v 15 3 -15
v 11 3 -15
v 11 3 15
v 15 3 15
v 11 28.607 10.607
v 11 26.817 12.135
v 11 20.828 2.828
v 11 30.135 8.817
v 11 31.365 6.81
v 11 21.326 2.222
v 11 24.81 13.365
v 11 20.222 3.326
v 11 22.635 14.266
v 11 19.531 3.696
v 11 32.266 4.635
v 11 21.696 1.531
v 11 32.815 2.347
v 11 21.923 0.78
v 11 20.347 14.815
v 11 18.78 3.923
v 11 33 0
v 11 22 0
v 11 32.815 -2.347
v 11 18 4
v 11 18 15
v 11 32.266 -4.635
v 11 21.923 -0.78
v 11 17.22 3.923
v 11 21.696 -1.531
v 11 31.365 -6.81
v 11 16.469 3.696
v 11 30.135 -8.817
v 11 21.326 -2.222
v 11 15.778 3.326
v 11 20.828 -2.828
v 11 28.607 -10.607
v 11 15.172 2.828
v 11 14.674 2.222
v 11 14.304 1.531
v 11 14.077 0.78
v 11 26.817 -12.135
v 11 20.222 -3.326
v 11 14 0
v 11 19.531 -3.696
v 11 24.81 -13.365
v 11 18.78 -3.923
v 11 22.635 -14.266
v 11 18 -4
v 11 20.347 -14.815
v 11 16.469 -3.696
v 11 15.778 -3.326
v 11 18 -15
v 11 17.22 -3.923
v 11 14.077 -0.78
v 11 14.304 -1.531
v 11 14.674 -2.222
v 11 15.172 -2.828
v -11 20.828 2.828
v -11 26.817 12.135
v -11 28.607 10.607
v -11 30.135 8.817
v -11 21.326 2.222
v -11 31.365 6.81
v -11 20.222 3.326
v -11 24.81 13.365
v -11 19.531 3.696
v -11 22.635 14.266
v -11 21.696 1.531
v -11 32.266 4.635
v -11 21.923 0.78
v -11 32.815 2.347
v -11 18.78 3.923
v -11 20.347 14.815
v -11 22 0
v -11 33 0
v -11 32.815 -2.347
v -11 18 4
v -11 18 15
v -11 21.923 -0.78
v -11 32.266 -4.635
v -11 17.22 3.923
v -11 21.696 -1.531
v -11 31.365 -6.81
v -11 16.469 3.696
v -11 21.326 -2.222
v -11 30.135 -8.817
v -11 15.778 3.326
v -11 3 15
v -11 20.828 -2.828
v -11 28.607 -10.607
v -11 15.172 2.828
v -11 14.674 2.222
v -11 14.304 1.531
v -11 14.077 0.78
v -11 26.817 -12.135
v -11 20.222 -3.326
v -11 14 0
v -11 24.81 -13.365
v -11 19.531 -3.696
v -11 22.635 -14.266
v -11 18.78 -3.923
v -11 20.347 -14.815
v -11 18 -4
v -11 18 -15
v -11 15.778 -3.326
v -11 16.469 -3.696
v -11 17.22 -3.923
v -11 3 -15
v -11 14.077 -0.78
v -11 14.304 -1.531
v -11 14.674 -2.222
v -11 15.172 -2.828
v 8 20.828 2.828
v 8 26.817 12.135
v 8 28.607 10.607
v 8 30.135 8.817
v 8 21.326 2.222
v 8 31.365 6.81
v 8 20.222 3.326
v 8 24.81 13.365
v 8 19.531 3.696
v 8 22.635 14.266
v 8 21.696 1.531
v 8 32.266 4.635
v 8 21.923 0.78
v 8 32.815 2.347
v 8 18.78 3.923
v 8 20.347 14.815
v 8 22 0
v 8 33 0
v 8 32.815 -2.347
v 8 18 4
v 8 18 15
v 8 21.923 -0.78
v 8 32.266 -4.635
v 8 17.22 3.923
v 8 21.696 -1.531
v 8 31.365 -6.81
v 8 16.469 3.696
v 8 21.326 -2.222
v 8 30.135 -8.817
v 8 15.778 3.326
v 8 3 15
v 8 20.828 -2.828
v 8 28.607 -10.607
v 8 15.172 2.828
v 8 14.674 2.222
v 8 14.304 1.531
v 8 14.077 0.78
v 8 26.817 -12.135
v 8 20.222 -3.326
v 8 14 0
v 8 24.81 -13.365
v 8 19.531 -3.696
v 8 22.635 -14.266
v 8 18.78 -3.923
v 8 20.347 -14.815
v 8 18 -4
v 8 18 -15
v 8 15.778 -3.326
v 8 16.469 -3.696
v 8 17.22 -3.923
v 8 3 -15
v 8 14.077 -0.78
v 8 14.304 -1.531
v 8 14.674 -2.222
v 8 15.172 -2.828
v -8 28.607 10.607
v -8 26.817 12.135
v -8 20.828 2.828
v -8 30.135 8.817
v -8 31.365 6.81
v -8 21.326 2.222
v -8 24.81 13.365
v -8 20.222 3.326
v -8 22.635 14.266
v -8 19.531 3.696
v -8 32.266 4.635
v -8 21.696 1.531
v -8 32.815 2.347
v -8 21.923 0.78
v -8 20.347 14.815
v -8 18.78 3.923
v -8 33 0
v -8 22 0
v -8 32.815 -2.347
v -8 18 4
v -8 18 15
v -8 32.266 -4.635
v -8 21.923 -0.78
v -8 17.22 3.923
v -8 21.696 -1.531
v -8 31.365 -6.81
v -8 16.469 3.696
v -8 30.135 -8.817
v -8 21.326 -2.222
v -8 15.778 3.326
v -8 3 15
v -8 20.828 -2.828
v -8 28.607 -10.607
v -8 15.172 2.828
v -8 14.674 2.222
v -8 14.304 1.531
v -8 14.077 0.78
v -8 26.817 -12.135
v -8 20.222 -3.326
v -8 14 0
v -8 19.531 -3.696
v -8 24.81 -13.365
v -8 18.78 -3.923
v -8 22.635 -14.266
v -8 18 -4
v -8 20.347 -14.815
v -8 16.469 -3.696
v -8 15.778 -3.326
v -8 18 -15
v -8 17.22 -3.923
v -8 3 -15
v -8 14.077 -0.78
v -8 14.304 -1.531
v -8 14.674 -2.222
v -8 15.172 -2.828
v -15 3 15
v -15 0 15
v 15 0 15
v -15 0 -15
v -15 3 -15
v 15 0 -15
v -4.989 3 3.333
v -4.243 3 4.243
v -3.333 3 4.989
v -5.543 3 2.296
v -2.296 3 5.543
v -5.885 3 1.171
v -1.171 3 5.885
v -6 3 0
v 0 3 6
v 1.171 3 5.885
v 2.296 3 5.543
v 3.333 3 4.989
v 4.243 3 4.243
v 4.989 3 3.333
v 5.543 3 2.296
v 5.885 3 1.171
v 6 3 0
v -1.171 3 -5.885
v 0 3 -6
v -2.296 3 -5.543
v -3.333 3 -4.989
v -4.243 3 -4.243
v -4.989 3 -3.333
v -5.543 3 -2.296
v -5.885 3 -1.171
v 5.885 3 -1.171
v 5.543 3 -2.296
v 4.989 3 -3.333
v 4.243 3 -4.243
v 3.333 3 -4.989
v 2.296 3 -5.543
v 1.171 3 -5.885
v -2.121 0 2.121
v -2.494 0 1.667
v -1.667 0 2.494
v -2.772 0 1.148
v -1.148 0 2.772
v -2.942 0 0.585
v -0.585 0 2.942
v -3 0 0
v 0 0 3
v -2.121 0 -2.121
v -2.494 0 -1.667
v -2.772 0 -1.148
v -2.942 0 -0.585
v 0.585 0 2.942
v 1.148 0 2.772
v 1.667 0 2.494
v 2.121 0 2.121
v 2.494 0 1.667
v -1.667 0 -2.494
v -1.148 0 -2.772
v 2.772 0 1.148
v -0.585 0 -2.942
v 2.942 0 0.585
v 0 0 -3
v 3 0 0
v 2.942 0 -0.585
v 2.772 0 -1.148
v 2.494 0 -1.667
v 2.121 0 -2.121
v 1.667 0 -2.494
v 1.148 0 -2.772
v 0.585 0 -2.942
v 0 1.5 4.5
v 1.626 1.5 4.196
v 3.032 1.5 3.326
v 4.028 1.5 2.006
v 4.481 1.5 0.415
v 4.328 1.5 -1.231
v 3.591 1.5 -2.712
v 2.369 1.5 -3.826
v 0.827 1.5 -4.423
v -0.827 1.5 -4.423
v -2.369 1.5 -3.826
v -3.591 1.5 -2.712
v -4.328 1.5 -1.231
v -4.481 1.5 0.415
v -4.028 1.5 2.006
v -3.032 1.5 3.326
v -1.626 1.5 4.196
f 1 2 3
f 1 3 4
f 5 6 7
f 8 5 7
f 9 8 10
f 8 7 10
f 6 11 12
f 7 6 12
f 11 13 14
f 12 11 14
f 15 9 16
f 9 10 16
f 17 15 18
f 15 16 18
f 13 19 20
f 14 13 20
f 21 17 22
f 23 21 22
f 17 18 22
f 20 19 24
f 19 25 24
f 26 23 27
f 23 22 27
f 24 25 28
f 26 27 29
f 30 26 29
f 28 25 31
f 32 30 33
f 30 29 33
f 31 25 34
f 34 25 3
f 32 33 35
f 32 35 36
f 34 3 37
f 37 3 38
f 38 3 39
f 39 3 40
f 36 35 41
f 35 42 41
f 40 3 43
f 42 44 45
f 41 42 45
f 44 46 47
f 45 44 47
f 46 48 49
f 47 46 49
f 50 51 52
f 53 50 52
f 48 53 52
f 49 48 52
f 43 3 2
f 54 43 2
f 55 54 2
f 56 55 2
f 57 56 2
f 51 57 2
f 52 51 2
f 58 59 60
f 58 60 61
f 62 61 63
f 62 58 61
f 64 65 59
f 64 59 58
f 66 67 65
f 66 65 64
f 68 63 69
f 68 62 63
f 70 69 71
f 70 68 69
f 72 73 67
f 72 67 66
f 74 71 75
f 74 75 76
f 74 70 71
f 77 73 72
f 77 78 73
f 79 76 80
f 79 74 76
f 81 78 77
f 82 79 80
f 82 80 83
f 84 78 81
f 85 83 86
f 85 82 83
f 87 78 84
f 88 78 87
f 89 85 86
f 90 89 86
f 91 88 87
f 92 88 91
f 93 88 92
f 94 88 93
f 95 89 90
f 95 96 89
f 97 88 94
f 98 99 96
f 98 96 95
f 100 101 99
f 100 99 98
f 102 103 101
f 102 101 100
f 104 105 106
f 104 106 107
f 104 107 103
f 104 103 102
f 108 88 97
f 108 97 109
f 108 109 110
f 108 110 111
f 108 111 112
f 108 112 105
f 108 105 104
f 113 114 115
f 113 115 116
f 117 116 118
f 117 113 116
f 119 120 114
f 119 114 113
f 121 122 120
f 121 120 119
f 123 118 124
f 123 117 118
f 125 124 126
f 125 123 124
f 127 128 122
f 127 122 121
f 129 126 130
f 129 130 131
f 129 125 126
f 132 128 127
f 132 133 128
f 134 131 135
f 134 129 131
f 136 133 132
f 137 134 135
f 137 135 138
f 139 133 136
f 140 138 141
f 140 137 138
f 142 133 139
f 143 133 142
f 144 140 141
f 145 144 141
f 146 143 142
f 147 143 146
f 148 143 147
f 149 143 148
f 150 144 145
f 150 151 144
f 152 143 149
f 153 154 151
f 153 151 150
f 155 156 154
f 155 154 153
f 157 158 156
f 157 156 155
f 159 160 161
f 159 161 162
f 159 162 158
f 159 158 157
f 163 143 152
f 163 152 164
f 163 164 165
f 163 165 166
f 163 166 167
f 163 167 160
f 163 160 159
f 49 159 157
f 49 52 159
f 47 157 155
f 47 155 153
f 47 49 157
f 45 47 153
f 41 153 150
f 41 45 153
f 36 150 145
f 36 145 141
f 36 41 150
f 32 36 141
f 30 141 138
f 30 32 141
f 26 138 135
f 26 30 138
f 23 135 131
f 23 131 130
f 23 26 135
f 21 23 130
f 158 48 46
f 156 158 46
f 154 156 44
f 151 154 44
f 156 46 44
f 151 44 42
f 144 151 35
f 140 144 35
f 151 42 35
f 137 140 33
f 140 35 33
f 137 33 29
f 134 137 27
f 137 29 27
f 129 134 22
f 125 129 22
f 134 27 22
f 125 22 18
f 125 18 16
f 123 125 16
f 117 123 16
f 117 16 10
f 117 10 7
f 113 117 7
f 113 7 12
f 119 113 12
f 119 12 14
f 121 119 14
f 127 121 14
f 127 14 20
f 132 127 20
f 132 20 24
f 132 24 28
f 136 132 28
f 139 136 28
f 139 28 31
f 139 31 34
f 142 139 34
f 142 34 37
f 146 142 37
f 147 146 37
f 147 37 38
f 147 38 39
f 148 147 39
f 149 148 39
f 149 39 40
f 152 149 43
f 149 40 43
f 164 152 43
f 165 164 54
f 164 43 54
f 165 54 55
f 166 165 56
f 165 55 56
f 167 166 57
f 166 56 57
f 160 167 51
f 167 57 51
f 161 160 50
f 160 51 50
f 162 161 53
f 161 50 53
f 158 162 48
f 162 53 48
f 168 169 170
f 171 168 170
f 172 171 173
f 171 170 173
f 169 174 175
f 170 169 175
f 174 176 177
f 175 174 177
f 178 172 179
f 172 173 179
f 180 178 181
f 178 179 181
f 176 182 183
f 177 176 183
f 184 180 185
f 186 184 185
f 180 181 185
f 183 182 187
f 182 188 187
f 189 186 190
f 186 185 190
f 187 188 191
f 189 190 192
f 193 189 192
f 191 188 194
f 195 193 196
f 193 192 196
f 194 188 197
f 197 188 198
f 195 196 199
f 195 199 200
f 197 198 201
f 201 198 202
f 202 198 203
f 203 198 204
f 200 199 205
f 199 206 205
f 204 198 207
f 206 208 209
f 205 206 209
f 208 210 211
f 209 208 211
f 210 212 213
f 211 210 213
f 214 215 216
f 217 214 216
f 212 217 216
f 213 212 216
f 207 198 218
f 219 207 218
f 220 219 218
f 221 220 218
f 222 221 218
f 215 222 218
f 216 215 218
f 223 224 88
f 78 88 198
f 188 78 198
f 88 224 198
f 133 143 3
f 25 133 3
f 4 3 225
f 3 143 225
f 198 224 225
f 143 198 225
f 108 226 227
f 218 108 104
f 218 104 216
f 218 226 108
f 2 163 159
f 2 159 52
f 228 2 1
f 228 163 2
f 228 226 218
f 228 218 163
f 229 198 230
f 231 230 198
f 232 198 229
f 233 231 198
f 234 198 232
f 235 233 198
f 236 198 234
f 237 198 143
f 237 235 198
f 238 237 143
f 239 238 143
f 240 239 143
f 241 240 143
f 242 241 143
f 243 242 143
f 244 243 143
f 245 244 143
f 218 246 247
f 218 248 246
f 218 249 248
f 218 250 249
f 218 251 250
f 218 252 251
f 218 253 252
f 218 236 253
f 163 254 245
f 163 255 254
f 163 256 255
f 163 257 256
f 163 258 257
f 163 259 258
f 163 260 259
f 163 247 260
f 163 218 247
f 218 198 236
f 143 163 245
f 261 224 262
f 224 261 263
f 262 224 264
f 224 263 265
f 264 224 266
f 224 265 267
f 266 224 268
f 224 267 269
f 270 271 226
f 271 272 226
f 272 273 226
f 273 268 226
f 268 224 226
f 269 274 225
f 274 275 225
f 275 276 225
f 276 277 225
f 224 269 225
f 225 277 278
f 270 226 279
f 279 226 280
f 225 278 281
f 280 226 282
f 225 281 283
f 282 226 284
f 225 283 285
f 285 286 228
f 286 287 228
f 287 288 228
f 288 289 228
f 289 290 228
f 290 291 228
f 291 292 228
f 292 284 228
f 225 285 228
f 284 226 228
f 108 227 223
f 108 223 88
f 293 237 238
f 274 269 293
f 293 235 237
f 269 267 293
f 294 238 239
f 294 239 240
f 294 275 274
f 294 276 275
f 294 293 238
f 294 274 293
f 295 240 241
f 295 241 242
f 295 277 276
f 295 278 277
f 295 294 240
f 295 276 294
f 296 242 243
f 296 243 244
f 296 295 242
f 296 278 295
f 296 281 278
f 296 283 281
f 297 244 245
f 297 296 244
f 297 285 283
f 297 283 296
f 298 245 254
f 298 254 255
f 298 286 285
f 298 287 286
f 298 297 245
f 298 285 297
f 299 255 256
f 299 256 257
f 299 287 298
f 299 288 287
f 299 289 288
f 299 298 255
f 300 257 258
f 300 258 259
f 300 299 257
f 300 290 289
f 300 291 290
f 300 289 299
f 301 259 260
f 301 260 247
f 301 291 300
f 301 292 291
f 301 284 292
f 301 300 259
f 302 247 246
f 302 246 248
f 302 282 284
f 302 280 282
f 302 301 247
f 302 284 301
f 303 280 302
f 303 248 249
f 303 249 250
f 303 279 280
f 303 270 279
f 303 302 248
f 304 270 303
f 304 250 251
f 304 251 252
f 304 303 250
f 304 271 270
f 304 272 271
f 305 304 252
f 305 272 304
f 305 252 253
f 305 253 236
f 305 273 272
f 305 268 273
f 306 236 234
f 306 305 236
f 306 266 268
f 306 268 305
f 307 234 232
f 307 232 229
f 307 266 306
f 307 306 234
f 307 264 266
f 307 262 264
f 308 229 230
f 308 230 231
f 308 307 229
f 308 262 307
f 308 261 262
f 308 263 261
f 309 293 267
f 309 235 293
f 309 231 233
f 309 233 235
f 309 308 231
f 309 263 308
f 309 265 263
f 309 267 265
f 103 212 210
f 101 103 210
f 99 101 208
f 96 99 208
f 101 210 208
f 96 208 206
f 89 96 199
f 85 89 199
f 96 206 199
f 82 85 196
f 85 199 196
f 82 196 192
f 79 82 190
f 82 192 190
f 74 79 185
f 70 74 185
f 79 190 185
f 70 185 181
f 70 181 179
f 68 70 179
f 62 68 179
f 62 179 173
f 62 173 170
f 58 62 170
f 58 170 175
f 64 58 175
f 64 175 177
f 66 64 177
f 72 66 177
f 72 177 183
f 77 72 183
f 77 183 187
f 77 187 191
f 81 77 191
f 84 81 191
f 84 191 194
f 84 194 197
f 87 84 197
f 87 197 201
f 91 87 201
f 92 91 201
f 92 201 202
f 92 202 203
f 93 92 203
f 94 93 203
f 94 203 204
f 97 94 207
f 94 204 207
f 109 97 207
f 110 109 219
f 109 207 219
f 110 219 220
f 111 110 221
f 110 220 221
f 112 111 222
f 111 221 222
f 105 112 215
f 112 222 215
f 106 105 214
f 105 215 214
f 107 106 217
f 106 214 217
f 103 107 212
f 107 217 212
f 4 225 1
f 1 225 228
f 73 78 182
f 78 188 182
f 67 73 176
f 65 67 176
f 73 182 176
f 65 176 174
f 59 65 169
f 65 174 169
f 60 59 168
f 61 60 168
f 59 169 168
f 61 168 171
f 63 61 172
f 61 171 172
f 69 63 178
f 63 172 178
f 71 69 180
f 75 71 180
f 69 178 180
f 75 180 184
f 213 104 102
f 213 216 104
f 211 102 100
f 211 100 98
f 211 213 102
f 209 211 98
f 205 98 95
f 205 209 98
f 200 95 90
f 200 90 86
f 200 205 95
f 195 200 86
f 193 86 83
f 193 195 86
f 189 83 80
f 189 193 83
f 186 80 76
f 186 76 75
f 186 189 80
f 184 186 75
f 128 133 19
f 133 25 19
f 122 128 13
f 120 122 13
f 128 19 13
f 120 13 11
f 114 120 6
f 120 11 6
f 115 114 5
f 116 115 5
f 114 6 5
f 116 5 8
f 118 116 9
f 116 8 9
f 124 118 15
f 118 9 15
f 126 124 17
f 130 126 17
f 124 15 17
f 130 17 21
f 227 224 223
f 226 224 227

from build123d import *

# Parameters (mm, degrees)
CROQUIS1_W              = 30
CROQUIS1_H              = 30
SALIENTE_EXTRUIR1_DEPTH = 3
CROQUIS2_W              = 3
CROQUIS2_H              = 30
SALIENTE_EXTRUIR2_DEPTH = 30
REDONDEO1_R             = 15
CROQUIS3_R              = 4
CORTAR_EXTRUIR1_DEPTH   = 45.609416046
CROQUIS4_R              = 3
CORTAR_EXTRUIR2_DEPTH   = 37.742346142
CHAFL_N1_SIZE           = 3


with BuildPart() as part:
    # Croquis1 → Saliente-Extruir1 (new body)
    with BuildSketch(Plane(origin=(0, 0, 0), x_dir=(1, 0, 0), z_dir=(0, 1, 0))):
        Rectangle(CROQUIS1_W, CROQUIS1_H)
    extrude(amount=SALIENTE_EXTRUIR1_DEPTH)

    # Croquis2 → Saliente-Extruir2 (add)
    with BuildSketch(Plane(origin=(0, 3, 0), x_dir=(1, 0, 0), z_dir=(0, 1, 0))):
        with Locations((-9.5, 0)):
            Rectangle(CROQUIS2_W, CROQUIS2_H)
        with Locations((9.5, 0)):
            Rectangle(CROQUIS2_W, CROQUIS2_H)
    extrude(amount=SALIENTE_EXTRUIR2_DEPTH)

    # Redondeo1
    redondeo1_edges = [part.edges().sort_by_distance(p)[0] for p in [
        (-9.5, 33, -15),
        (9.5, 33, -15),
        (9.5, 33, 15),
        (-9.5, 33, 15),
    ]]
    fillet(redondeo1_edges, radius=REDONDEO1_R - 0.0001)  # a hair under: the kernel refuses the full size

    # Croquis3 → Cortar-Extruir1 (cut, through all)
    with BuildSketch(Plane(origin=(11, 0, 0), x_dir=(0, 0, -1), z_dir=(1, 0, 0))):
        with Locations((0, 18)):
            Circle(CROQUIS3_R)
    extrude(amount=-CORTAR_EXTRUIR1_DEPTH, mode=Mode.SUBTRACT)

    # Croquis4 → Cortar-Extruir2 (cut, through all)
    with BuildSketch(Plane(origin=(0, 3, 0), x_dir=(1, 0, 0), z_dir=(0, 1, 0))):
        with Locations(Location((0, 0, 0), (0, 0, 270))):
            Circle(CROQUIS4_R)
    extrude(amount=-CORTAR_EXTRUIR2_DEPTH, mode=Mode.SUBTRACT)

    # Chaflán1
    chafl_n1_edges = [part.edges().sort_by_distance(p)[0] for p in [
        (0, 3, -3),
    ]]
    chamfer(chafl_n1_edges, length=CHAFL_N1_SIZE - 0.0001)  # a hair under: the kernel refuses the full size


solid = part.part
